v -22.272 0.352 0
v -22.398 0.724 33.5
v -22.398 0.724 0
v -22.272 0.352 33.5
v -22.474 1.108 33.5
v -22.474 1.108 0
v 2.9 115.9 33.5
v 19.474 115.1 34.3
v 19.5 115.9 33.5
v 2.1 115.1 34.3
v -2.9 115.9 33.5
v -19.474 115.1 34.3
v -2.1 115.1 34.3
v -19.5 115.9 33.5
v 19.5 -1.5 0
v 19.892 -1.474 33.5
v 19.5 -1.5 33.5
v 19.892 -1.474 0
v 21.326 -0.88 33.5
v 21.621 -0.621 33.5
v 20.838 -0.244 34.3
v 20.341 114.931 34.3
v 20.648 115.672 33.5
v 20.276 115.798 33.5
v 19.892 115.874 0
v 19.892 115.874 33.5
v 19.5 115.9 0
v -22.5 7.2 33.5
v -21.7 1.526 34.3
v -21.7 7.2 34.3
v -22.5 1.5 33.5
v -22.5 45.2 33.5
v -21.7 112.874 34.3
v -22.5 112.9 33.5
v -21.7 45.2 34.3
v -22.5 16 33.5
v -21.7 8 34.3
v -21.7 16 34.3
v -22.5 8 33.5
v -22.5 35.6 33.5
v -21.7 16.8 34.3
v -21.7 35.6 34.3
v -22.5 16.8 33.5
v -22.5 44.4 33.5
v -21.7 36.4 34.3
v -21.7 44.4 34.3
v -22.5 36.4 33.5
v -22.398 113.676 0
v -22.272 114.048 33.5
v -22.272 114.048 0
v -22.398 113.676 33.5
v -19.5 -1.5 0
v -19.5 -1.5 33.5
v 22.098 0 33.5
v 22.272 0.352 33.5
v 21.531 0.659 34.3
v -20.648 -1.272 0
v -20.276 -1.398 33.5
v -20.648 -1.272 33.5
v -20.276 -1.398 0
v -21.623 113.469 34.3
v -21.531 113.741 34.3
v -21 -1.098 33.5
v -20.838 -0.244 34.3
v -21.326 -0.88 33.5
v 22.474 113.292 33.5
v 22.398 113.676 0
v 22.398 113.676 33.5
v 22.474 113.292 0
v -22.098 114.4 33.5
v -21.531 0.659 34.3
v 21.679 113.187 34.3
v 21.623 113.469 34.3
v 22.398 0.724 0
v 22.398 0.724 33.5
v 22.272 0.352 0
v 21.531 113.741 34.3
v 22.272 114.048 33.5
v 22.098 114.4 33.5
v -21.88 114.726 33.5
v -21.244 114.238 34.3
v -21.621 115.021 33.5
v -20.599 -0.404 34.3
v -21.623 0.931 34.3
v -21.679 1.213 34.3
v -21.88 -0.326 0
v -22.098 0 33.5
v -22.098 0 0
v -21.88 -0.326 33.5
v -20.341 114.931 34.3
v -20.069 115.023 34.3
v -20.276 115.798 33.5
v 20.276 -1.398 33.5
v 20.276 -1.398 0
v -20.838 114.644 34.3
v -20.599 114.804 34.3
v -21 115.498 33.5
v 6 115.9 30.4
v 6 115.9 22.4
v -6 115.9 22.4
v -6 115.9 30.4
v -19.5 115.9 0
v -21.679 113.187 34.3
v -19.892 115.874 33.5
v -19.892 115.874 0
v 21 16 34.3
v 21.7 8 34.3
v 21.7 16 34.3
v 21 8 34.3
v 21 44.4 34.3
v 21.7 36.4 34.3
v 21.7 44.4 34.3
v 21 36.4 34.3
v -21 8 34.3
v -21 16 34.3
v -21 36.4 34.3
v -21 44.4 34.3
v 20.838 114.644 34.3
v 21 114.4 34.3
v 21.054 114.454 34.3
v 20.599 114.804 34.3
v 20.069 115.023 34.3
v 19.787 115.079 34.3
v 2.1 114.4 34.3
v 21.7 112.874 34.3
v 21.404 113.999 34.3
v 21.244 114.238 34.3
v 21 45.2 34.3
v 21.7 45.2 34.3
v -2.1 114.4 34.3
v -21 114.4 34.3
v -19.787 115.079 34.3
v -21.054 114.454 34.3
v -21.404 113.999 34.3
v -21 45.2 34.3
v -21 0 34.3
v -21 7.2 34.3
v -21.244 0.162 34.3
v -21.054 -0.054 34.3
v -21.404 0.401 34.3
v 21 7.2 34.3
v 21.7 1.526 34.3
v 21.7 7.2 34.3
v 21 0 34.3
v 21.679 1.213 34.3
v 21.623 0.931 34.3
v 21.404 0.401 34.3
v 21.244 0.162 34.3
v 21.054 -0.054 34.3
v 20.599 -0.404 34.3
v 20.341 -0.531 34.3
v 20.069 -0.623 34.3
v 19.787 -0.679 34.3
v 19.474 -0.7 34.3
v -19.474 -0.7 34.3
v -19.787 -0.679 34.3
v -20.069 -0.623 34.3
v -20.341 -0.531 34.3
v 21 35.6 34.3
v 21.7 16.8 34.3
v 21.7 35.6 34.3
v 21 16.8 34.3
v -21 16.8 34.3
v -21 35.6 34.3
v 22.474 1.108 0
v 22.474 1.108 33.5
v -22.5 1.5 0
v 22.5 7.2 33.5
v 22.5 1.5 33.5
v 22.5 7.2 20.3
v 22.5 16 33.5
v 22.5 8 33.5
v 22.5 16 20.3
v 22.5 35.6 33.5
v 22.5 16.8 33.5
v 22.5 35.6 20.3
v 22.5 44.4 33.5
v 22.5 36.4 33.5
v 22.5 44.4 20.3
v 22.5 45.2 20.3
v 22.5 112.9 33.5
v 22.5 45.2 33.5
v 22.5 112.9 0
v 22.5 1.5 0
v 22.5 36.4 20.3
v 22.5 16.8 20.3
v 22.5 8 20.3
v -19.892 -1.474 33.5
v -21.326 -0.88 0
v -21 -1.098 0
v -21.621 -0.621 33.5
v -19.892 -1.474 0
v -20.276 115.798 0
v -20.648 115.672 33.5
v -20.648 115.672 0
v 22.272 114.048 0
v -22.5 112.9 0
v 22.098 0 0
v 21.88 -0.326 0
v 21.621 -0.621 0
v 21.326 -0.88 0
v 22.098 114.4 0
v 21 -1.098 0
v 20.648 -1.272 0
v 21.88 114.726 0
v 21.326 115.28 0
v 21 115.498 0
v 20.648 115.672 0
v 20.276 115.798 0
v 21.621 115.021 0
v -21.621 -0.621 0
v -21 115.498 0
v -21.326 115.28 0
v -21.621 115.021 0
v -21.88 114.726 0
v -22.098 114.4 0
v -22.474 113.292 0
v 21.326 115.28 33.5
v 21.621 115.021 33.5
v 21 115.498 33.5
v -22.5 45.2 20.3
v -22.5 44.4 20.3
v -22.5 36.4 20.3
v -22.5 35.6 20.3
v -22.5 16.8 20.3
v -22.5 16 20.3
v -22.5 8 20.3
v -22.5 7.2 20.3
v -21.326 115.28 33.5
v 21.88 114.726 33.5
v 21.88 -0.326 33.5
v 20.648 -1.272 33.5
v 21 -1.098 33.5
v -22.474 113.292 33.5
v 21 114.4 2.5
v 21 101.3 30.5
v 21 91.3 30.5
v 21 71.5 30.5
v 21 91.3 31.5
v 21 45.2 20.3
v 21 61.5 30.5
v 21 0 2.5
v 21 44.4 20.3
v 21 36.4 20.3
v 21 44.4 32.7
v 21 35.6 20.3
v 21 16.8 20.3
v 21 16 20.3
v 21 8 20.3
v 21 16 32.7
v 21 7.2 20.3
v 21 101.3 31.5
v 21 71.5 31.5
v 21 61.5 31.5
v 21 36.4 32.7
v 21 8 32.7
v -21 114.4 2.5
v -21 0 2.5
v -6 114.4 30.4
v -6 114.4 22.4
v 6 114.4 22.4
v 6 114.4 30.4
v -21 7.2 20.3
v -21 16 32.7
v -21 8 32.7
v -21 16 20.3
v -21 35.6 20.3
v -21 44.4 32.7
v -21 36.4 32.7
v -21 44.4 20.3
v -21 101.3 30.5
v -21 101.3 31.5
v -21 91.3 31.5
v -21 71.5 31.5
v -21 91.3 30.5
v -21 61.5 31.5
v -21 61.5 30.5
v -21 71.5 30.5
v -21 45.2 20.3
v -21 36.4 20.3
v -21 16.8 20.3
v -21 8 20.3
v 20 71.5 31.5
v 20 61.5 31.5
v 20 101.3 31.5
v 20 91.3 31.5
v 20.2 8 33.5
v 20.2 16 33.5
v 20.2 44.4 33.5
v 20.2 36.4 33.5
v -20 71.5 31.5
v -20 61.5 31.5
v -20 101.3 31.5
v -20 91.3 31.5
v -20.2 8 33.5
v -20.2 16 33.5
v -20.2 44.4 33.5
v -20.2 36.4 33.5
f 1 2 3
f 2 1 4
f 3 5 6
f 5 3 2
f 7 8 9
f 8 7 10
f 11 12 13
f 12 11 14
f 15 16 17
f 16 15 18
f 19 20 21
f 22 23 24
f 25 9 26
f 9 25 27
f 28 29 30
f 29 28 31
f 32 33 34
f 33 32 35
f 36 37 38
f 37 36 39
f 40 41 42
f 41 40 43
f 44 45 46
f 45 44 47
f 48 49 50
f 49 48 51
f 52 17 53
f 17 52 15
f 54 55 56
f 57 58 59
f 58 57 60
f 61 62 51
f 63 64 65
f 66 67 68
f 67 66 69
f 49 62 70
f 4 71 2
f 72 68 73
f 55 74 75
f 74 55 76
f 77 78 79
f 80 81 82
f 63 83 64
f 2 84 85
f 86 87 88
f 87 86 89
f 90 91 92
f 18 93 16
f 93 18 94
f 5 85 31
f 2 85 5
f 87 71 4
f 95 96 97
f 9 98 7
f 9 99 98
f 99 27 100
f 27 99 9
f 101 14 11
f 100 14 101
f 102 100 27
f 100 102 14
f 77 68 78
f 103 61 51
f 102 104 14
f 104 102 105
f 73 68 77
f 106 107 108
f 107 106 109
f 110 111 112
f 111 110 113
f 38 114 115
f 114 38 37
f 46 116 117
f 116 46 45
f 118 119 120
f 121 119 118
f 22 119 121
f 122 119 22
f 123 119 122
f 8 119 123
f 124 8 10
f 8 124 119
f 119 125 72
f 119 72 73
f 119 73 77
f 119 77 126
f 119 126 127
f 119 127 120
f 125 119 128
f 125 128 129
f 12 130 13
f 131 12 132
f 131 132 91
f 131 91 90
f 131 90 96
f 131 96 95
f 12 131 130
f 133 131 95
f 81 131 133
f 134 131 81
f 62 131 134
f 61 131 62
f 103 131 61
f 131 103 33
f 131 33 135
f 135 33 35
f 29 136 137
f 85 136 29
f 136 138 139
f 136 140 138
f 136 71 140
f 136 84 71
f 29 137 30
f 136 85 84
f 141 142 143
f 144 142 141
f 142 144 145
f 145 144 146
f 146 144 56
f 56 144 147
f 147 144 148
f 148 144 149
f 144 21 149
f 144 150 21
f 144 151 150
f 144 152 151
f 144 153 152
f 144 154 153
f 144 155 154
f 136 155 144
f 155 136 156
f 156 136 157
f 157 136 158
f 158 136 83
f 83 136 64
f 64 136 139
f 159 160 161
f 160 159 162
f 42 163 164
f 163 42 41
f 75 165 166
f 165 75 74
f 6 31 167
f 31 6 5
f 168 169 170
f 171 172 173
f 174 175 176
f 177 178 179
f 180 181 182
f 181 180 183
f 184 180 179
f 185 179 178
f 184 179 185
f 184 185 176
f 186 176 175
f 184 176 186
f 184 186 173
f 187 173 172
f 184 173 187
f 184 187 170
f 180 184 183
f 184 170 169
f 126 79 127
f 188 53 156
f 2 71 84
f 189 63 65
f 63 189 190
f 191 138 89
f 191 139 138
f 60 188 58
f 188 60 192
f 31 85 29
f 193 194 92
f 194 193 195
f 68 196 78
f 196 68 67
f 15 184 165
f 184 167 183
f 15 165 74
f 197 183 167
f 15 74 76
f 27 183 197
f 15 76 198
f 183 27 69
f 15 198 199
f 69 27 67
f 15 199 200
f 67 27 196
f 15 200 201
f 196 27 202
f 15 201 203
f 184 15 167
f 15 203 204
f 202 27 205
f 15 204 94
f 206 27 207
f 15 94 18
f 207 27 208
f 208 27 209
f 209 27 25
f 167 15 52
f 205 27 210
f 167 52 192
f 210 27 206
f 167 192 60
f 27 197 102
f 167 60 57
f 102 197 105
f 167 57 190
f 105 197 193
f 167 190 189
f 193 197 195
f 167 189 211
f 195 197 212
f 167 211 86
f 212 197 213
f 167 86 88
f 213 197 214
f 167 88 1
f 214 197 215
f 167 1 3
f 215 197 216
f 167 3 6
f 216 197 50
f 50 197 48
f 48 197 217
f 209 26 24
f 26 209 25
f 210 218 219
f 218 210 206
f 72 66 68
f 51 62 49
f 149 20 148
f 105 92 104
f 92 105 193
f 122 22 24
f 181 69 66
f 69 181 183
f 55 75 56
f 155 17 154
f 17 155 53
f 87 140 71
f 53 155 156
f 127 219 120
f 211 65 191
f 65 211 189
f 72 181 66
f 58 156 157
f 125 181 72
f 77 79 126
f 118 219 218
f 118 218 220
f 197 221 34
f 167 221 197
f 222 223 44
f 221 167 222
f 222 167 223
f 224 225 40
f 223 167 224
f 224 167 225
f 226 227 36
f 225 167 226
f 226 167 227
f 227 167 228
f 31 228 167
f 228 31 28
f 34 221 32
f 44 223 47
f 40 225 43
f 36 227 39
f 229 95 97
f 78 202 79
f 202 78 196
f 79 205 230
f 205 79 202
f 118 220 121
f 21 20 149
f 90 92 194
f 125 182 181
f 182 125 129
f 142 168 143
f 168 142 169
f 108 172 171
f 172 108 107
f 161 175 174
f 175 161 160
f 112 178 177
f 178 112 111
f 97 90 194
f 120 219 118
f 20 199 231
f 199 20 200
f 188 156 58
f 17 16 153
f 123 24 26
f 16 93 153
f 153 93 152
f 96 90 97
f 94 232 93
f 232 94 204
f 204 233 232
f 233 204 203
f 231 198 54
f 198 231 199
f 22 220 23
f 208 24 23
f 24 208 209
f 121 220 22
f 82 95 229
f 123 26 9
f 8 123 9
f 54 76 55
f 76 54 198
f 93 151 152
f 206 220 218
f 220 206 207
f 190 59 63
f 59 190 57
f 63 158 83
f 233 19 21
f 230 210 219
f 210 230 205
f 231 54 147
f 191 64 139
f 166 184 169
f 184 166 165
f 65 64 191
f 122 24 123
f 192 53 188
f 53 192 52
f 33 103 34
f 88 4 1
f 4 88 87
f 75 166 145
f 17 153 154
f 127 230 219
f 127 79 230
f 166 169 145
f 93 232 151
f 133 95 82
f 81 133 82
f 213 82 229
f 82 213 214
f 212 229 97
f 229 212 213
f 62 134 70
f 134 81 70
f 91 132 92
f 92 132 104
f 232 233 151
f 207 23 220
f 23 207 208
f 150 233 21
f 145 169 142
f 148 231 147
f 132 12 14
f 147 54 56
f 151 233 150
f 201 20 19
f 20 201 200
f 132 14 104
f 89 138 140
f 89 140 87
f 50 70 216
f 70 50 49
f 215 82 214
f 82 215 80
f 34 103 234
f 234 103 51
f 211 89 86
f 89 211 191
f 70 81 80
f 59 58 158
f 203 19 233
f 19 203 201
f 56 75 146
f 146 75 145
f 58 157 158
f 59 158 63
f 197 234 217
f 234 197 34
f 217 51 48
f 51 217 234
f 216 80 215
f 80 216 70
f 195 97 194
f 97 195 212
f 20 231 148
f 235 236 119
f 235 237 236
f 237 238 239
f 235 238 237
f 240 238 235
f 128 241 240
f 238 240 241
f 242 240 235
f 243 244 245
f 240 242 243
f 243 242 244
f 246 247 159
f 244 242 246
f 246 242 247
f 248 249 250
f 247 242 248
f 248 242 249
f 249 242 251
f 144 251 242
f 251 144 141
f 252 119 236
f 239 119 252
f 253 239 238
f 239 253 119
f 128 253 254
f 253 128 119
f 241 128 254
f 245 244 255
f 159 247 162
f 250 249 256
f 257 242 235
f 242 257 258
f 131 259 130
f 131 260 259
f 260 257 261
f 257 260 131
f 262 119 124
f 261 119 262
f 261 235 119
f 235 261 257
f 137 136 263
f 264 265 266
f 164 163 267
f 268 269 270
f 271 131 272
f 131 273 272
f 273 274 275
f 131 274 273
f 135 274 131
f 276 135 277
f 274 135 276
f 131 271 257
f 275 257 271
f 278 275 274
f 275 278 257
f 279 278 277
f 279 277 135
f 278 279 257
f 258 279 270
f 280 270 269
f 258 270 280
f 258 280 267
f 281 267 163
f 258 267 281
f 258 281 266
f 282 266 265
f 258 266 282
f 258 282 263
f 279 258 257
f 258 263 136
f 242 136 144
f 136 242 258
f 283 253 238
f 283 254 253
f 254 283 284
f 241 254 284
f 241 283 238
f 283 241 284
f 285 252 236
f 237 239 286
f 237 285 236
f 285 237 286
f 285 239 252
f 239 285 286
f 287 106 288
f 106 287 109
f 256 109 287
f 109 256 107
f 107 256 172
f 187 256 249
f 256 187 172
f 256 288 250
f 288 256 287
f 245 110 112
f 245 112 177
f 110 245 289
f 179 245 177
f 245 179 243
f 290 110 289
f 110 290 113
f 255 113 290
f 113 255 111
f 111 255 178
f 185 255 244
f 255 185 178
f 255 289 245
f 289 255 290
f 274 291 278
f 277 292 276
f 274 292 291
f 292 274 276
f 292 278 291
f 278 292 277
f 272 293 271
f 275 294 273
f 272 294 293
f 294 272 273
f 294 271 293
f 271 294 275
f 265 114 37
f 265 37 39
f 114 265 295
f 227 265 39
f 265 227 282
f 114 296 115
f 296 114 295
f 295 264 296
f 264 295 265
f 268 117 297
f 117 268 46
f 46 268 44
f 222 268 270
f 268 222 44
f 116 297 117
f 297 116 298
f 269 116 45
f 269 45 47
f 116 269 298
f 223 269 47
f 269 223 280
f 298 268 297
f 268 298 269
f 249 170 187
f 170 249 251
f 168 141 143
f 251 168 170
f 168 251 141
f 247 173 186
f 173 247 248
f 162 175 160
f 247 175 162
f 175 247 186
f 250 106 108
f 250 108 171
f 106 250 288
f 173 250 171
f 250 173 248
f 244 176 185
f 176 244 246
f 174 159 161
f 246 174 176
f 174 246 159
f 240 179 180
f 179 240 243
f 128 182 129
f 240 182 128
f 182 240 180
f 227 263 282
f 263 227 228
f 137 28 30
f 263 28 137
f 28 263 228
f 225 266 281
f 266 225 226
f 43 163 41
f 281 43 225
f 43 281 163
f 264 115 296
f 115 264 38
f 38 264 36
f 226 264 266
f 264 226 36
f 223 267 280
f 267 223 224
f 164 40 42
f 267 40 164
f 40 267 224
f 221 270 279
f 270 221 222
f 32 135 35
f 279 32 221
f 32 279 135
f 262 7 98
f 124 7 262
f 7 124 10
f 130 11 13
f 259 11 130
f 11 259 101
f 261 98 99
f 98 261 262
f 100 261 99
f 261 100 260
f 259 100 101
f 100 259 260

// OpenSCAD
// Back tray: built from model.scad as its own part.
include <model.scad>
view = "tray";
